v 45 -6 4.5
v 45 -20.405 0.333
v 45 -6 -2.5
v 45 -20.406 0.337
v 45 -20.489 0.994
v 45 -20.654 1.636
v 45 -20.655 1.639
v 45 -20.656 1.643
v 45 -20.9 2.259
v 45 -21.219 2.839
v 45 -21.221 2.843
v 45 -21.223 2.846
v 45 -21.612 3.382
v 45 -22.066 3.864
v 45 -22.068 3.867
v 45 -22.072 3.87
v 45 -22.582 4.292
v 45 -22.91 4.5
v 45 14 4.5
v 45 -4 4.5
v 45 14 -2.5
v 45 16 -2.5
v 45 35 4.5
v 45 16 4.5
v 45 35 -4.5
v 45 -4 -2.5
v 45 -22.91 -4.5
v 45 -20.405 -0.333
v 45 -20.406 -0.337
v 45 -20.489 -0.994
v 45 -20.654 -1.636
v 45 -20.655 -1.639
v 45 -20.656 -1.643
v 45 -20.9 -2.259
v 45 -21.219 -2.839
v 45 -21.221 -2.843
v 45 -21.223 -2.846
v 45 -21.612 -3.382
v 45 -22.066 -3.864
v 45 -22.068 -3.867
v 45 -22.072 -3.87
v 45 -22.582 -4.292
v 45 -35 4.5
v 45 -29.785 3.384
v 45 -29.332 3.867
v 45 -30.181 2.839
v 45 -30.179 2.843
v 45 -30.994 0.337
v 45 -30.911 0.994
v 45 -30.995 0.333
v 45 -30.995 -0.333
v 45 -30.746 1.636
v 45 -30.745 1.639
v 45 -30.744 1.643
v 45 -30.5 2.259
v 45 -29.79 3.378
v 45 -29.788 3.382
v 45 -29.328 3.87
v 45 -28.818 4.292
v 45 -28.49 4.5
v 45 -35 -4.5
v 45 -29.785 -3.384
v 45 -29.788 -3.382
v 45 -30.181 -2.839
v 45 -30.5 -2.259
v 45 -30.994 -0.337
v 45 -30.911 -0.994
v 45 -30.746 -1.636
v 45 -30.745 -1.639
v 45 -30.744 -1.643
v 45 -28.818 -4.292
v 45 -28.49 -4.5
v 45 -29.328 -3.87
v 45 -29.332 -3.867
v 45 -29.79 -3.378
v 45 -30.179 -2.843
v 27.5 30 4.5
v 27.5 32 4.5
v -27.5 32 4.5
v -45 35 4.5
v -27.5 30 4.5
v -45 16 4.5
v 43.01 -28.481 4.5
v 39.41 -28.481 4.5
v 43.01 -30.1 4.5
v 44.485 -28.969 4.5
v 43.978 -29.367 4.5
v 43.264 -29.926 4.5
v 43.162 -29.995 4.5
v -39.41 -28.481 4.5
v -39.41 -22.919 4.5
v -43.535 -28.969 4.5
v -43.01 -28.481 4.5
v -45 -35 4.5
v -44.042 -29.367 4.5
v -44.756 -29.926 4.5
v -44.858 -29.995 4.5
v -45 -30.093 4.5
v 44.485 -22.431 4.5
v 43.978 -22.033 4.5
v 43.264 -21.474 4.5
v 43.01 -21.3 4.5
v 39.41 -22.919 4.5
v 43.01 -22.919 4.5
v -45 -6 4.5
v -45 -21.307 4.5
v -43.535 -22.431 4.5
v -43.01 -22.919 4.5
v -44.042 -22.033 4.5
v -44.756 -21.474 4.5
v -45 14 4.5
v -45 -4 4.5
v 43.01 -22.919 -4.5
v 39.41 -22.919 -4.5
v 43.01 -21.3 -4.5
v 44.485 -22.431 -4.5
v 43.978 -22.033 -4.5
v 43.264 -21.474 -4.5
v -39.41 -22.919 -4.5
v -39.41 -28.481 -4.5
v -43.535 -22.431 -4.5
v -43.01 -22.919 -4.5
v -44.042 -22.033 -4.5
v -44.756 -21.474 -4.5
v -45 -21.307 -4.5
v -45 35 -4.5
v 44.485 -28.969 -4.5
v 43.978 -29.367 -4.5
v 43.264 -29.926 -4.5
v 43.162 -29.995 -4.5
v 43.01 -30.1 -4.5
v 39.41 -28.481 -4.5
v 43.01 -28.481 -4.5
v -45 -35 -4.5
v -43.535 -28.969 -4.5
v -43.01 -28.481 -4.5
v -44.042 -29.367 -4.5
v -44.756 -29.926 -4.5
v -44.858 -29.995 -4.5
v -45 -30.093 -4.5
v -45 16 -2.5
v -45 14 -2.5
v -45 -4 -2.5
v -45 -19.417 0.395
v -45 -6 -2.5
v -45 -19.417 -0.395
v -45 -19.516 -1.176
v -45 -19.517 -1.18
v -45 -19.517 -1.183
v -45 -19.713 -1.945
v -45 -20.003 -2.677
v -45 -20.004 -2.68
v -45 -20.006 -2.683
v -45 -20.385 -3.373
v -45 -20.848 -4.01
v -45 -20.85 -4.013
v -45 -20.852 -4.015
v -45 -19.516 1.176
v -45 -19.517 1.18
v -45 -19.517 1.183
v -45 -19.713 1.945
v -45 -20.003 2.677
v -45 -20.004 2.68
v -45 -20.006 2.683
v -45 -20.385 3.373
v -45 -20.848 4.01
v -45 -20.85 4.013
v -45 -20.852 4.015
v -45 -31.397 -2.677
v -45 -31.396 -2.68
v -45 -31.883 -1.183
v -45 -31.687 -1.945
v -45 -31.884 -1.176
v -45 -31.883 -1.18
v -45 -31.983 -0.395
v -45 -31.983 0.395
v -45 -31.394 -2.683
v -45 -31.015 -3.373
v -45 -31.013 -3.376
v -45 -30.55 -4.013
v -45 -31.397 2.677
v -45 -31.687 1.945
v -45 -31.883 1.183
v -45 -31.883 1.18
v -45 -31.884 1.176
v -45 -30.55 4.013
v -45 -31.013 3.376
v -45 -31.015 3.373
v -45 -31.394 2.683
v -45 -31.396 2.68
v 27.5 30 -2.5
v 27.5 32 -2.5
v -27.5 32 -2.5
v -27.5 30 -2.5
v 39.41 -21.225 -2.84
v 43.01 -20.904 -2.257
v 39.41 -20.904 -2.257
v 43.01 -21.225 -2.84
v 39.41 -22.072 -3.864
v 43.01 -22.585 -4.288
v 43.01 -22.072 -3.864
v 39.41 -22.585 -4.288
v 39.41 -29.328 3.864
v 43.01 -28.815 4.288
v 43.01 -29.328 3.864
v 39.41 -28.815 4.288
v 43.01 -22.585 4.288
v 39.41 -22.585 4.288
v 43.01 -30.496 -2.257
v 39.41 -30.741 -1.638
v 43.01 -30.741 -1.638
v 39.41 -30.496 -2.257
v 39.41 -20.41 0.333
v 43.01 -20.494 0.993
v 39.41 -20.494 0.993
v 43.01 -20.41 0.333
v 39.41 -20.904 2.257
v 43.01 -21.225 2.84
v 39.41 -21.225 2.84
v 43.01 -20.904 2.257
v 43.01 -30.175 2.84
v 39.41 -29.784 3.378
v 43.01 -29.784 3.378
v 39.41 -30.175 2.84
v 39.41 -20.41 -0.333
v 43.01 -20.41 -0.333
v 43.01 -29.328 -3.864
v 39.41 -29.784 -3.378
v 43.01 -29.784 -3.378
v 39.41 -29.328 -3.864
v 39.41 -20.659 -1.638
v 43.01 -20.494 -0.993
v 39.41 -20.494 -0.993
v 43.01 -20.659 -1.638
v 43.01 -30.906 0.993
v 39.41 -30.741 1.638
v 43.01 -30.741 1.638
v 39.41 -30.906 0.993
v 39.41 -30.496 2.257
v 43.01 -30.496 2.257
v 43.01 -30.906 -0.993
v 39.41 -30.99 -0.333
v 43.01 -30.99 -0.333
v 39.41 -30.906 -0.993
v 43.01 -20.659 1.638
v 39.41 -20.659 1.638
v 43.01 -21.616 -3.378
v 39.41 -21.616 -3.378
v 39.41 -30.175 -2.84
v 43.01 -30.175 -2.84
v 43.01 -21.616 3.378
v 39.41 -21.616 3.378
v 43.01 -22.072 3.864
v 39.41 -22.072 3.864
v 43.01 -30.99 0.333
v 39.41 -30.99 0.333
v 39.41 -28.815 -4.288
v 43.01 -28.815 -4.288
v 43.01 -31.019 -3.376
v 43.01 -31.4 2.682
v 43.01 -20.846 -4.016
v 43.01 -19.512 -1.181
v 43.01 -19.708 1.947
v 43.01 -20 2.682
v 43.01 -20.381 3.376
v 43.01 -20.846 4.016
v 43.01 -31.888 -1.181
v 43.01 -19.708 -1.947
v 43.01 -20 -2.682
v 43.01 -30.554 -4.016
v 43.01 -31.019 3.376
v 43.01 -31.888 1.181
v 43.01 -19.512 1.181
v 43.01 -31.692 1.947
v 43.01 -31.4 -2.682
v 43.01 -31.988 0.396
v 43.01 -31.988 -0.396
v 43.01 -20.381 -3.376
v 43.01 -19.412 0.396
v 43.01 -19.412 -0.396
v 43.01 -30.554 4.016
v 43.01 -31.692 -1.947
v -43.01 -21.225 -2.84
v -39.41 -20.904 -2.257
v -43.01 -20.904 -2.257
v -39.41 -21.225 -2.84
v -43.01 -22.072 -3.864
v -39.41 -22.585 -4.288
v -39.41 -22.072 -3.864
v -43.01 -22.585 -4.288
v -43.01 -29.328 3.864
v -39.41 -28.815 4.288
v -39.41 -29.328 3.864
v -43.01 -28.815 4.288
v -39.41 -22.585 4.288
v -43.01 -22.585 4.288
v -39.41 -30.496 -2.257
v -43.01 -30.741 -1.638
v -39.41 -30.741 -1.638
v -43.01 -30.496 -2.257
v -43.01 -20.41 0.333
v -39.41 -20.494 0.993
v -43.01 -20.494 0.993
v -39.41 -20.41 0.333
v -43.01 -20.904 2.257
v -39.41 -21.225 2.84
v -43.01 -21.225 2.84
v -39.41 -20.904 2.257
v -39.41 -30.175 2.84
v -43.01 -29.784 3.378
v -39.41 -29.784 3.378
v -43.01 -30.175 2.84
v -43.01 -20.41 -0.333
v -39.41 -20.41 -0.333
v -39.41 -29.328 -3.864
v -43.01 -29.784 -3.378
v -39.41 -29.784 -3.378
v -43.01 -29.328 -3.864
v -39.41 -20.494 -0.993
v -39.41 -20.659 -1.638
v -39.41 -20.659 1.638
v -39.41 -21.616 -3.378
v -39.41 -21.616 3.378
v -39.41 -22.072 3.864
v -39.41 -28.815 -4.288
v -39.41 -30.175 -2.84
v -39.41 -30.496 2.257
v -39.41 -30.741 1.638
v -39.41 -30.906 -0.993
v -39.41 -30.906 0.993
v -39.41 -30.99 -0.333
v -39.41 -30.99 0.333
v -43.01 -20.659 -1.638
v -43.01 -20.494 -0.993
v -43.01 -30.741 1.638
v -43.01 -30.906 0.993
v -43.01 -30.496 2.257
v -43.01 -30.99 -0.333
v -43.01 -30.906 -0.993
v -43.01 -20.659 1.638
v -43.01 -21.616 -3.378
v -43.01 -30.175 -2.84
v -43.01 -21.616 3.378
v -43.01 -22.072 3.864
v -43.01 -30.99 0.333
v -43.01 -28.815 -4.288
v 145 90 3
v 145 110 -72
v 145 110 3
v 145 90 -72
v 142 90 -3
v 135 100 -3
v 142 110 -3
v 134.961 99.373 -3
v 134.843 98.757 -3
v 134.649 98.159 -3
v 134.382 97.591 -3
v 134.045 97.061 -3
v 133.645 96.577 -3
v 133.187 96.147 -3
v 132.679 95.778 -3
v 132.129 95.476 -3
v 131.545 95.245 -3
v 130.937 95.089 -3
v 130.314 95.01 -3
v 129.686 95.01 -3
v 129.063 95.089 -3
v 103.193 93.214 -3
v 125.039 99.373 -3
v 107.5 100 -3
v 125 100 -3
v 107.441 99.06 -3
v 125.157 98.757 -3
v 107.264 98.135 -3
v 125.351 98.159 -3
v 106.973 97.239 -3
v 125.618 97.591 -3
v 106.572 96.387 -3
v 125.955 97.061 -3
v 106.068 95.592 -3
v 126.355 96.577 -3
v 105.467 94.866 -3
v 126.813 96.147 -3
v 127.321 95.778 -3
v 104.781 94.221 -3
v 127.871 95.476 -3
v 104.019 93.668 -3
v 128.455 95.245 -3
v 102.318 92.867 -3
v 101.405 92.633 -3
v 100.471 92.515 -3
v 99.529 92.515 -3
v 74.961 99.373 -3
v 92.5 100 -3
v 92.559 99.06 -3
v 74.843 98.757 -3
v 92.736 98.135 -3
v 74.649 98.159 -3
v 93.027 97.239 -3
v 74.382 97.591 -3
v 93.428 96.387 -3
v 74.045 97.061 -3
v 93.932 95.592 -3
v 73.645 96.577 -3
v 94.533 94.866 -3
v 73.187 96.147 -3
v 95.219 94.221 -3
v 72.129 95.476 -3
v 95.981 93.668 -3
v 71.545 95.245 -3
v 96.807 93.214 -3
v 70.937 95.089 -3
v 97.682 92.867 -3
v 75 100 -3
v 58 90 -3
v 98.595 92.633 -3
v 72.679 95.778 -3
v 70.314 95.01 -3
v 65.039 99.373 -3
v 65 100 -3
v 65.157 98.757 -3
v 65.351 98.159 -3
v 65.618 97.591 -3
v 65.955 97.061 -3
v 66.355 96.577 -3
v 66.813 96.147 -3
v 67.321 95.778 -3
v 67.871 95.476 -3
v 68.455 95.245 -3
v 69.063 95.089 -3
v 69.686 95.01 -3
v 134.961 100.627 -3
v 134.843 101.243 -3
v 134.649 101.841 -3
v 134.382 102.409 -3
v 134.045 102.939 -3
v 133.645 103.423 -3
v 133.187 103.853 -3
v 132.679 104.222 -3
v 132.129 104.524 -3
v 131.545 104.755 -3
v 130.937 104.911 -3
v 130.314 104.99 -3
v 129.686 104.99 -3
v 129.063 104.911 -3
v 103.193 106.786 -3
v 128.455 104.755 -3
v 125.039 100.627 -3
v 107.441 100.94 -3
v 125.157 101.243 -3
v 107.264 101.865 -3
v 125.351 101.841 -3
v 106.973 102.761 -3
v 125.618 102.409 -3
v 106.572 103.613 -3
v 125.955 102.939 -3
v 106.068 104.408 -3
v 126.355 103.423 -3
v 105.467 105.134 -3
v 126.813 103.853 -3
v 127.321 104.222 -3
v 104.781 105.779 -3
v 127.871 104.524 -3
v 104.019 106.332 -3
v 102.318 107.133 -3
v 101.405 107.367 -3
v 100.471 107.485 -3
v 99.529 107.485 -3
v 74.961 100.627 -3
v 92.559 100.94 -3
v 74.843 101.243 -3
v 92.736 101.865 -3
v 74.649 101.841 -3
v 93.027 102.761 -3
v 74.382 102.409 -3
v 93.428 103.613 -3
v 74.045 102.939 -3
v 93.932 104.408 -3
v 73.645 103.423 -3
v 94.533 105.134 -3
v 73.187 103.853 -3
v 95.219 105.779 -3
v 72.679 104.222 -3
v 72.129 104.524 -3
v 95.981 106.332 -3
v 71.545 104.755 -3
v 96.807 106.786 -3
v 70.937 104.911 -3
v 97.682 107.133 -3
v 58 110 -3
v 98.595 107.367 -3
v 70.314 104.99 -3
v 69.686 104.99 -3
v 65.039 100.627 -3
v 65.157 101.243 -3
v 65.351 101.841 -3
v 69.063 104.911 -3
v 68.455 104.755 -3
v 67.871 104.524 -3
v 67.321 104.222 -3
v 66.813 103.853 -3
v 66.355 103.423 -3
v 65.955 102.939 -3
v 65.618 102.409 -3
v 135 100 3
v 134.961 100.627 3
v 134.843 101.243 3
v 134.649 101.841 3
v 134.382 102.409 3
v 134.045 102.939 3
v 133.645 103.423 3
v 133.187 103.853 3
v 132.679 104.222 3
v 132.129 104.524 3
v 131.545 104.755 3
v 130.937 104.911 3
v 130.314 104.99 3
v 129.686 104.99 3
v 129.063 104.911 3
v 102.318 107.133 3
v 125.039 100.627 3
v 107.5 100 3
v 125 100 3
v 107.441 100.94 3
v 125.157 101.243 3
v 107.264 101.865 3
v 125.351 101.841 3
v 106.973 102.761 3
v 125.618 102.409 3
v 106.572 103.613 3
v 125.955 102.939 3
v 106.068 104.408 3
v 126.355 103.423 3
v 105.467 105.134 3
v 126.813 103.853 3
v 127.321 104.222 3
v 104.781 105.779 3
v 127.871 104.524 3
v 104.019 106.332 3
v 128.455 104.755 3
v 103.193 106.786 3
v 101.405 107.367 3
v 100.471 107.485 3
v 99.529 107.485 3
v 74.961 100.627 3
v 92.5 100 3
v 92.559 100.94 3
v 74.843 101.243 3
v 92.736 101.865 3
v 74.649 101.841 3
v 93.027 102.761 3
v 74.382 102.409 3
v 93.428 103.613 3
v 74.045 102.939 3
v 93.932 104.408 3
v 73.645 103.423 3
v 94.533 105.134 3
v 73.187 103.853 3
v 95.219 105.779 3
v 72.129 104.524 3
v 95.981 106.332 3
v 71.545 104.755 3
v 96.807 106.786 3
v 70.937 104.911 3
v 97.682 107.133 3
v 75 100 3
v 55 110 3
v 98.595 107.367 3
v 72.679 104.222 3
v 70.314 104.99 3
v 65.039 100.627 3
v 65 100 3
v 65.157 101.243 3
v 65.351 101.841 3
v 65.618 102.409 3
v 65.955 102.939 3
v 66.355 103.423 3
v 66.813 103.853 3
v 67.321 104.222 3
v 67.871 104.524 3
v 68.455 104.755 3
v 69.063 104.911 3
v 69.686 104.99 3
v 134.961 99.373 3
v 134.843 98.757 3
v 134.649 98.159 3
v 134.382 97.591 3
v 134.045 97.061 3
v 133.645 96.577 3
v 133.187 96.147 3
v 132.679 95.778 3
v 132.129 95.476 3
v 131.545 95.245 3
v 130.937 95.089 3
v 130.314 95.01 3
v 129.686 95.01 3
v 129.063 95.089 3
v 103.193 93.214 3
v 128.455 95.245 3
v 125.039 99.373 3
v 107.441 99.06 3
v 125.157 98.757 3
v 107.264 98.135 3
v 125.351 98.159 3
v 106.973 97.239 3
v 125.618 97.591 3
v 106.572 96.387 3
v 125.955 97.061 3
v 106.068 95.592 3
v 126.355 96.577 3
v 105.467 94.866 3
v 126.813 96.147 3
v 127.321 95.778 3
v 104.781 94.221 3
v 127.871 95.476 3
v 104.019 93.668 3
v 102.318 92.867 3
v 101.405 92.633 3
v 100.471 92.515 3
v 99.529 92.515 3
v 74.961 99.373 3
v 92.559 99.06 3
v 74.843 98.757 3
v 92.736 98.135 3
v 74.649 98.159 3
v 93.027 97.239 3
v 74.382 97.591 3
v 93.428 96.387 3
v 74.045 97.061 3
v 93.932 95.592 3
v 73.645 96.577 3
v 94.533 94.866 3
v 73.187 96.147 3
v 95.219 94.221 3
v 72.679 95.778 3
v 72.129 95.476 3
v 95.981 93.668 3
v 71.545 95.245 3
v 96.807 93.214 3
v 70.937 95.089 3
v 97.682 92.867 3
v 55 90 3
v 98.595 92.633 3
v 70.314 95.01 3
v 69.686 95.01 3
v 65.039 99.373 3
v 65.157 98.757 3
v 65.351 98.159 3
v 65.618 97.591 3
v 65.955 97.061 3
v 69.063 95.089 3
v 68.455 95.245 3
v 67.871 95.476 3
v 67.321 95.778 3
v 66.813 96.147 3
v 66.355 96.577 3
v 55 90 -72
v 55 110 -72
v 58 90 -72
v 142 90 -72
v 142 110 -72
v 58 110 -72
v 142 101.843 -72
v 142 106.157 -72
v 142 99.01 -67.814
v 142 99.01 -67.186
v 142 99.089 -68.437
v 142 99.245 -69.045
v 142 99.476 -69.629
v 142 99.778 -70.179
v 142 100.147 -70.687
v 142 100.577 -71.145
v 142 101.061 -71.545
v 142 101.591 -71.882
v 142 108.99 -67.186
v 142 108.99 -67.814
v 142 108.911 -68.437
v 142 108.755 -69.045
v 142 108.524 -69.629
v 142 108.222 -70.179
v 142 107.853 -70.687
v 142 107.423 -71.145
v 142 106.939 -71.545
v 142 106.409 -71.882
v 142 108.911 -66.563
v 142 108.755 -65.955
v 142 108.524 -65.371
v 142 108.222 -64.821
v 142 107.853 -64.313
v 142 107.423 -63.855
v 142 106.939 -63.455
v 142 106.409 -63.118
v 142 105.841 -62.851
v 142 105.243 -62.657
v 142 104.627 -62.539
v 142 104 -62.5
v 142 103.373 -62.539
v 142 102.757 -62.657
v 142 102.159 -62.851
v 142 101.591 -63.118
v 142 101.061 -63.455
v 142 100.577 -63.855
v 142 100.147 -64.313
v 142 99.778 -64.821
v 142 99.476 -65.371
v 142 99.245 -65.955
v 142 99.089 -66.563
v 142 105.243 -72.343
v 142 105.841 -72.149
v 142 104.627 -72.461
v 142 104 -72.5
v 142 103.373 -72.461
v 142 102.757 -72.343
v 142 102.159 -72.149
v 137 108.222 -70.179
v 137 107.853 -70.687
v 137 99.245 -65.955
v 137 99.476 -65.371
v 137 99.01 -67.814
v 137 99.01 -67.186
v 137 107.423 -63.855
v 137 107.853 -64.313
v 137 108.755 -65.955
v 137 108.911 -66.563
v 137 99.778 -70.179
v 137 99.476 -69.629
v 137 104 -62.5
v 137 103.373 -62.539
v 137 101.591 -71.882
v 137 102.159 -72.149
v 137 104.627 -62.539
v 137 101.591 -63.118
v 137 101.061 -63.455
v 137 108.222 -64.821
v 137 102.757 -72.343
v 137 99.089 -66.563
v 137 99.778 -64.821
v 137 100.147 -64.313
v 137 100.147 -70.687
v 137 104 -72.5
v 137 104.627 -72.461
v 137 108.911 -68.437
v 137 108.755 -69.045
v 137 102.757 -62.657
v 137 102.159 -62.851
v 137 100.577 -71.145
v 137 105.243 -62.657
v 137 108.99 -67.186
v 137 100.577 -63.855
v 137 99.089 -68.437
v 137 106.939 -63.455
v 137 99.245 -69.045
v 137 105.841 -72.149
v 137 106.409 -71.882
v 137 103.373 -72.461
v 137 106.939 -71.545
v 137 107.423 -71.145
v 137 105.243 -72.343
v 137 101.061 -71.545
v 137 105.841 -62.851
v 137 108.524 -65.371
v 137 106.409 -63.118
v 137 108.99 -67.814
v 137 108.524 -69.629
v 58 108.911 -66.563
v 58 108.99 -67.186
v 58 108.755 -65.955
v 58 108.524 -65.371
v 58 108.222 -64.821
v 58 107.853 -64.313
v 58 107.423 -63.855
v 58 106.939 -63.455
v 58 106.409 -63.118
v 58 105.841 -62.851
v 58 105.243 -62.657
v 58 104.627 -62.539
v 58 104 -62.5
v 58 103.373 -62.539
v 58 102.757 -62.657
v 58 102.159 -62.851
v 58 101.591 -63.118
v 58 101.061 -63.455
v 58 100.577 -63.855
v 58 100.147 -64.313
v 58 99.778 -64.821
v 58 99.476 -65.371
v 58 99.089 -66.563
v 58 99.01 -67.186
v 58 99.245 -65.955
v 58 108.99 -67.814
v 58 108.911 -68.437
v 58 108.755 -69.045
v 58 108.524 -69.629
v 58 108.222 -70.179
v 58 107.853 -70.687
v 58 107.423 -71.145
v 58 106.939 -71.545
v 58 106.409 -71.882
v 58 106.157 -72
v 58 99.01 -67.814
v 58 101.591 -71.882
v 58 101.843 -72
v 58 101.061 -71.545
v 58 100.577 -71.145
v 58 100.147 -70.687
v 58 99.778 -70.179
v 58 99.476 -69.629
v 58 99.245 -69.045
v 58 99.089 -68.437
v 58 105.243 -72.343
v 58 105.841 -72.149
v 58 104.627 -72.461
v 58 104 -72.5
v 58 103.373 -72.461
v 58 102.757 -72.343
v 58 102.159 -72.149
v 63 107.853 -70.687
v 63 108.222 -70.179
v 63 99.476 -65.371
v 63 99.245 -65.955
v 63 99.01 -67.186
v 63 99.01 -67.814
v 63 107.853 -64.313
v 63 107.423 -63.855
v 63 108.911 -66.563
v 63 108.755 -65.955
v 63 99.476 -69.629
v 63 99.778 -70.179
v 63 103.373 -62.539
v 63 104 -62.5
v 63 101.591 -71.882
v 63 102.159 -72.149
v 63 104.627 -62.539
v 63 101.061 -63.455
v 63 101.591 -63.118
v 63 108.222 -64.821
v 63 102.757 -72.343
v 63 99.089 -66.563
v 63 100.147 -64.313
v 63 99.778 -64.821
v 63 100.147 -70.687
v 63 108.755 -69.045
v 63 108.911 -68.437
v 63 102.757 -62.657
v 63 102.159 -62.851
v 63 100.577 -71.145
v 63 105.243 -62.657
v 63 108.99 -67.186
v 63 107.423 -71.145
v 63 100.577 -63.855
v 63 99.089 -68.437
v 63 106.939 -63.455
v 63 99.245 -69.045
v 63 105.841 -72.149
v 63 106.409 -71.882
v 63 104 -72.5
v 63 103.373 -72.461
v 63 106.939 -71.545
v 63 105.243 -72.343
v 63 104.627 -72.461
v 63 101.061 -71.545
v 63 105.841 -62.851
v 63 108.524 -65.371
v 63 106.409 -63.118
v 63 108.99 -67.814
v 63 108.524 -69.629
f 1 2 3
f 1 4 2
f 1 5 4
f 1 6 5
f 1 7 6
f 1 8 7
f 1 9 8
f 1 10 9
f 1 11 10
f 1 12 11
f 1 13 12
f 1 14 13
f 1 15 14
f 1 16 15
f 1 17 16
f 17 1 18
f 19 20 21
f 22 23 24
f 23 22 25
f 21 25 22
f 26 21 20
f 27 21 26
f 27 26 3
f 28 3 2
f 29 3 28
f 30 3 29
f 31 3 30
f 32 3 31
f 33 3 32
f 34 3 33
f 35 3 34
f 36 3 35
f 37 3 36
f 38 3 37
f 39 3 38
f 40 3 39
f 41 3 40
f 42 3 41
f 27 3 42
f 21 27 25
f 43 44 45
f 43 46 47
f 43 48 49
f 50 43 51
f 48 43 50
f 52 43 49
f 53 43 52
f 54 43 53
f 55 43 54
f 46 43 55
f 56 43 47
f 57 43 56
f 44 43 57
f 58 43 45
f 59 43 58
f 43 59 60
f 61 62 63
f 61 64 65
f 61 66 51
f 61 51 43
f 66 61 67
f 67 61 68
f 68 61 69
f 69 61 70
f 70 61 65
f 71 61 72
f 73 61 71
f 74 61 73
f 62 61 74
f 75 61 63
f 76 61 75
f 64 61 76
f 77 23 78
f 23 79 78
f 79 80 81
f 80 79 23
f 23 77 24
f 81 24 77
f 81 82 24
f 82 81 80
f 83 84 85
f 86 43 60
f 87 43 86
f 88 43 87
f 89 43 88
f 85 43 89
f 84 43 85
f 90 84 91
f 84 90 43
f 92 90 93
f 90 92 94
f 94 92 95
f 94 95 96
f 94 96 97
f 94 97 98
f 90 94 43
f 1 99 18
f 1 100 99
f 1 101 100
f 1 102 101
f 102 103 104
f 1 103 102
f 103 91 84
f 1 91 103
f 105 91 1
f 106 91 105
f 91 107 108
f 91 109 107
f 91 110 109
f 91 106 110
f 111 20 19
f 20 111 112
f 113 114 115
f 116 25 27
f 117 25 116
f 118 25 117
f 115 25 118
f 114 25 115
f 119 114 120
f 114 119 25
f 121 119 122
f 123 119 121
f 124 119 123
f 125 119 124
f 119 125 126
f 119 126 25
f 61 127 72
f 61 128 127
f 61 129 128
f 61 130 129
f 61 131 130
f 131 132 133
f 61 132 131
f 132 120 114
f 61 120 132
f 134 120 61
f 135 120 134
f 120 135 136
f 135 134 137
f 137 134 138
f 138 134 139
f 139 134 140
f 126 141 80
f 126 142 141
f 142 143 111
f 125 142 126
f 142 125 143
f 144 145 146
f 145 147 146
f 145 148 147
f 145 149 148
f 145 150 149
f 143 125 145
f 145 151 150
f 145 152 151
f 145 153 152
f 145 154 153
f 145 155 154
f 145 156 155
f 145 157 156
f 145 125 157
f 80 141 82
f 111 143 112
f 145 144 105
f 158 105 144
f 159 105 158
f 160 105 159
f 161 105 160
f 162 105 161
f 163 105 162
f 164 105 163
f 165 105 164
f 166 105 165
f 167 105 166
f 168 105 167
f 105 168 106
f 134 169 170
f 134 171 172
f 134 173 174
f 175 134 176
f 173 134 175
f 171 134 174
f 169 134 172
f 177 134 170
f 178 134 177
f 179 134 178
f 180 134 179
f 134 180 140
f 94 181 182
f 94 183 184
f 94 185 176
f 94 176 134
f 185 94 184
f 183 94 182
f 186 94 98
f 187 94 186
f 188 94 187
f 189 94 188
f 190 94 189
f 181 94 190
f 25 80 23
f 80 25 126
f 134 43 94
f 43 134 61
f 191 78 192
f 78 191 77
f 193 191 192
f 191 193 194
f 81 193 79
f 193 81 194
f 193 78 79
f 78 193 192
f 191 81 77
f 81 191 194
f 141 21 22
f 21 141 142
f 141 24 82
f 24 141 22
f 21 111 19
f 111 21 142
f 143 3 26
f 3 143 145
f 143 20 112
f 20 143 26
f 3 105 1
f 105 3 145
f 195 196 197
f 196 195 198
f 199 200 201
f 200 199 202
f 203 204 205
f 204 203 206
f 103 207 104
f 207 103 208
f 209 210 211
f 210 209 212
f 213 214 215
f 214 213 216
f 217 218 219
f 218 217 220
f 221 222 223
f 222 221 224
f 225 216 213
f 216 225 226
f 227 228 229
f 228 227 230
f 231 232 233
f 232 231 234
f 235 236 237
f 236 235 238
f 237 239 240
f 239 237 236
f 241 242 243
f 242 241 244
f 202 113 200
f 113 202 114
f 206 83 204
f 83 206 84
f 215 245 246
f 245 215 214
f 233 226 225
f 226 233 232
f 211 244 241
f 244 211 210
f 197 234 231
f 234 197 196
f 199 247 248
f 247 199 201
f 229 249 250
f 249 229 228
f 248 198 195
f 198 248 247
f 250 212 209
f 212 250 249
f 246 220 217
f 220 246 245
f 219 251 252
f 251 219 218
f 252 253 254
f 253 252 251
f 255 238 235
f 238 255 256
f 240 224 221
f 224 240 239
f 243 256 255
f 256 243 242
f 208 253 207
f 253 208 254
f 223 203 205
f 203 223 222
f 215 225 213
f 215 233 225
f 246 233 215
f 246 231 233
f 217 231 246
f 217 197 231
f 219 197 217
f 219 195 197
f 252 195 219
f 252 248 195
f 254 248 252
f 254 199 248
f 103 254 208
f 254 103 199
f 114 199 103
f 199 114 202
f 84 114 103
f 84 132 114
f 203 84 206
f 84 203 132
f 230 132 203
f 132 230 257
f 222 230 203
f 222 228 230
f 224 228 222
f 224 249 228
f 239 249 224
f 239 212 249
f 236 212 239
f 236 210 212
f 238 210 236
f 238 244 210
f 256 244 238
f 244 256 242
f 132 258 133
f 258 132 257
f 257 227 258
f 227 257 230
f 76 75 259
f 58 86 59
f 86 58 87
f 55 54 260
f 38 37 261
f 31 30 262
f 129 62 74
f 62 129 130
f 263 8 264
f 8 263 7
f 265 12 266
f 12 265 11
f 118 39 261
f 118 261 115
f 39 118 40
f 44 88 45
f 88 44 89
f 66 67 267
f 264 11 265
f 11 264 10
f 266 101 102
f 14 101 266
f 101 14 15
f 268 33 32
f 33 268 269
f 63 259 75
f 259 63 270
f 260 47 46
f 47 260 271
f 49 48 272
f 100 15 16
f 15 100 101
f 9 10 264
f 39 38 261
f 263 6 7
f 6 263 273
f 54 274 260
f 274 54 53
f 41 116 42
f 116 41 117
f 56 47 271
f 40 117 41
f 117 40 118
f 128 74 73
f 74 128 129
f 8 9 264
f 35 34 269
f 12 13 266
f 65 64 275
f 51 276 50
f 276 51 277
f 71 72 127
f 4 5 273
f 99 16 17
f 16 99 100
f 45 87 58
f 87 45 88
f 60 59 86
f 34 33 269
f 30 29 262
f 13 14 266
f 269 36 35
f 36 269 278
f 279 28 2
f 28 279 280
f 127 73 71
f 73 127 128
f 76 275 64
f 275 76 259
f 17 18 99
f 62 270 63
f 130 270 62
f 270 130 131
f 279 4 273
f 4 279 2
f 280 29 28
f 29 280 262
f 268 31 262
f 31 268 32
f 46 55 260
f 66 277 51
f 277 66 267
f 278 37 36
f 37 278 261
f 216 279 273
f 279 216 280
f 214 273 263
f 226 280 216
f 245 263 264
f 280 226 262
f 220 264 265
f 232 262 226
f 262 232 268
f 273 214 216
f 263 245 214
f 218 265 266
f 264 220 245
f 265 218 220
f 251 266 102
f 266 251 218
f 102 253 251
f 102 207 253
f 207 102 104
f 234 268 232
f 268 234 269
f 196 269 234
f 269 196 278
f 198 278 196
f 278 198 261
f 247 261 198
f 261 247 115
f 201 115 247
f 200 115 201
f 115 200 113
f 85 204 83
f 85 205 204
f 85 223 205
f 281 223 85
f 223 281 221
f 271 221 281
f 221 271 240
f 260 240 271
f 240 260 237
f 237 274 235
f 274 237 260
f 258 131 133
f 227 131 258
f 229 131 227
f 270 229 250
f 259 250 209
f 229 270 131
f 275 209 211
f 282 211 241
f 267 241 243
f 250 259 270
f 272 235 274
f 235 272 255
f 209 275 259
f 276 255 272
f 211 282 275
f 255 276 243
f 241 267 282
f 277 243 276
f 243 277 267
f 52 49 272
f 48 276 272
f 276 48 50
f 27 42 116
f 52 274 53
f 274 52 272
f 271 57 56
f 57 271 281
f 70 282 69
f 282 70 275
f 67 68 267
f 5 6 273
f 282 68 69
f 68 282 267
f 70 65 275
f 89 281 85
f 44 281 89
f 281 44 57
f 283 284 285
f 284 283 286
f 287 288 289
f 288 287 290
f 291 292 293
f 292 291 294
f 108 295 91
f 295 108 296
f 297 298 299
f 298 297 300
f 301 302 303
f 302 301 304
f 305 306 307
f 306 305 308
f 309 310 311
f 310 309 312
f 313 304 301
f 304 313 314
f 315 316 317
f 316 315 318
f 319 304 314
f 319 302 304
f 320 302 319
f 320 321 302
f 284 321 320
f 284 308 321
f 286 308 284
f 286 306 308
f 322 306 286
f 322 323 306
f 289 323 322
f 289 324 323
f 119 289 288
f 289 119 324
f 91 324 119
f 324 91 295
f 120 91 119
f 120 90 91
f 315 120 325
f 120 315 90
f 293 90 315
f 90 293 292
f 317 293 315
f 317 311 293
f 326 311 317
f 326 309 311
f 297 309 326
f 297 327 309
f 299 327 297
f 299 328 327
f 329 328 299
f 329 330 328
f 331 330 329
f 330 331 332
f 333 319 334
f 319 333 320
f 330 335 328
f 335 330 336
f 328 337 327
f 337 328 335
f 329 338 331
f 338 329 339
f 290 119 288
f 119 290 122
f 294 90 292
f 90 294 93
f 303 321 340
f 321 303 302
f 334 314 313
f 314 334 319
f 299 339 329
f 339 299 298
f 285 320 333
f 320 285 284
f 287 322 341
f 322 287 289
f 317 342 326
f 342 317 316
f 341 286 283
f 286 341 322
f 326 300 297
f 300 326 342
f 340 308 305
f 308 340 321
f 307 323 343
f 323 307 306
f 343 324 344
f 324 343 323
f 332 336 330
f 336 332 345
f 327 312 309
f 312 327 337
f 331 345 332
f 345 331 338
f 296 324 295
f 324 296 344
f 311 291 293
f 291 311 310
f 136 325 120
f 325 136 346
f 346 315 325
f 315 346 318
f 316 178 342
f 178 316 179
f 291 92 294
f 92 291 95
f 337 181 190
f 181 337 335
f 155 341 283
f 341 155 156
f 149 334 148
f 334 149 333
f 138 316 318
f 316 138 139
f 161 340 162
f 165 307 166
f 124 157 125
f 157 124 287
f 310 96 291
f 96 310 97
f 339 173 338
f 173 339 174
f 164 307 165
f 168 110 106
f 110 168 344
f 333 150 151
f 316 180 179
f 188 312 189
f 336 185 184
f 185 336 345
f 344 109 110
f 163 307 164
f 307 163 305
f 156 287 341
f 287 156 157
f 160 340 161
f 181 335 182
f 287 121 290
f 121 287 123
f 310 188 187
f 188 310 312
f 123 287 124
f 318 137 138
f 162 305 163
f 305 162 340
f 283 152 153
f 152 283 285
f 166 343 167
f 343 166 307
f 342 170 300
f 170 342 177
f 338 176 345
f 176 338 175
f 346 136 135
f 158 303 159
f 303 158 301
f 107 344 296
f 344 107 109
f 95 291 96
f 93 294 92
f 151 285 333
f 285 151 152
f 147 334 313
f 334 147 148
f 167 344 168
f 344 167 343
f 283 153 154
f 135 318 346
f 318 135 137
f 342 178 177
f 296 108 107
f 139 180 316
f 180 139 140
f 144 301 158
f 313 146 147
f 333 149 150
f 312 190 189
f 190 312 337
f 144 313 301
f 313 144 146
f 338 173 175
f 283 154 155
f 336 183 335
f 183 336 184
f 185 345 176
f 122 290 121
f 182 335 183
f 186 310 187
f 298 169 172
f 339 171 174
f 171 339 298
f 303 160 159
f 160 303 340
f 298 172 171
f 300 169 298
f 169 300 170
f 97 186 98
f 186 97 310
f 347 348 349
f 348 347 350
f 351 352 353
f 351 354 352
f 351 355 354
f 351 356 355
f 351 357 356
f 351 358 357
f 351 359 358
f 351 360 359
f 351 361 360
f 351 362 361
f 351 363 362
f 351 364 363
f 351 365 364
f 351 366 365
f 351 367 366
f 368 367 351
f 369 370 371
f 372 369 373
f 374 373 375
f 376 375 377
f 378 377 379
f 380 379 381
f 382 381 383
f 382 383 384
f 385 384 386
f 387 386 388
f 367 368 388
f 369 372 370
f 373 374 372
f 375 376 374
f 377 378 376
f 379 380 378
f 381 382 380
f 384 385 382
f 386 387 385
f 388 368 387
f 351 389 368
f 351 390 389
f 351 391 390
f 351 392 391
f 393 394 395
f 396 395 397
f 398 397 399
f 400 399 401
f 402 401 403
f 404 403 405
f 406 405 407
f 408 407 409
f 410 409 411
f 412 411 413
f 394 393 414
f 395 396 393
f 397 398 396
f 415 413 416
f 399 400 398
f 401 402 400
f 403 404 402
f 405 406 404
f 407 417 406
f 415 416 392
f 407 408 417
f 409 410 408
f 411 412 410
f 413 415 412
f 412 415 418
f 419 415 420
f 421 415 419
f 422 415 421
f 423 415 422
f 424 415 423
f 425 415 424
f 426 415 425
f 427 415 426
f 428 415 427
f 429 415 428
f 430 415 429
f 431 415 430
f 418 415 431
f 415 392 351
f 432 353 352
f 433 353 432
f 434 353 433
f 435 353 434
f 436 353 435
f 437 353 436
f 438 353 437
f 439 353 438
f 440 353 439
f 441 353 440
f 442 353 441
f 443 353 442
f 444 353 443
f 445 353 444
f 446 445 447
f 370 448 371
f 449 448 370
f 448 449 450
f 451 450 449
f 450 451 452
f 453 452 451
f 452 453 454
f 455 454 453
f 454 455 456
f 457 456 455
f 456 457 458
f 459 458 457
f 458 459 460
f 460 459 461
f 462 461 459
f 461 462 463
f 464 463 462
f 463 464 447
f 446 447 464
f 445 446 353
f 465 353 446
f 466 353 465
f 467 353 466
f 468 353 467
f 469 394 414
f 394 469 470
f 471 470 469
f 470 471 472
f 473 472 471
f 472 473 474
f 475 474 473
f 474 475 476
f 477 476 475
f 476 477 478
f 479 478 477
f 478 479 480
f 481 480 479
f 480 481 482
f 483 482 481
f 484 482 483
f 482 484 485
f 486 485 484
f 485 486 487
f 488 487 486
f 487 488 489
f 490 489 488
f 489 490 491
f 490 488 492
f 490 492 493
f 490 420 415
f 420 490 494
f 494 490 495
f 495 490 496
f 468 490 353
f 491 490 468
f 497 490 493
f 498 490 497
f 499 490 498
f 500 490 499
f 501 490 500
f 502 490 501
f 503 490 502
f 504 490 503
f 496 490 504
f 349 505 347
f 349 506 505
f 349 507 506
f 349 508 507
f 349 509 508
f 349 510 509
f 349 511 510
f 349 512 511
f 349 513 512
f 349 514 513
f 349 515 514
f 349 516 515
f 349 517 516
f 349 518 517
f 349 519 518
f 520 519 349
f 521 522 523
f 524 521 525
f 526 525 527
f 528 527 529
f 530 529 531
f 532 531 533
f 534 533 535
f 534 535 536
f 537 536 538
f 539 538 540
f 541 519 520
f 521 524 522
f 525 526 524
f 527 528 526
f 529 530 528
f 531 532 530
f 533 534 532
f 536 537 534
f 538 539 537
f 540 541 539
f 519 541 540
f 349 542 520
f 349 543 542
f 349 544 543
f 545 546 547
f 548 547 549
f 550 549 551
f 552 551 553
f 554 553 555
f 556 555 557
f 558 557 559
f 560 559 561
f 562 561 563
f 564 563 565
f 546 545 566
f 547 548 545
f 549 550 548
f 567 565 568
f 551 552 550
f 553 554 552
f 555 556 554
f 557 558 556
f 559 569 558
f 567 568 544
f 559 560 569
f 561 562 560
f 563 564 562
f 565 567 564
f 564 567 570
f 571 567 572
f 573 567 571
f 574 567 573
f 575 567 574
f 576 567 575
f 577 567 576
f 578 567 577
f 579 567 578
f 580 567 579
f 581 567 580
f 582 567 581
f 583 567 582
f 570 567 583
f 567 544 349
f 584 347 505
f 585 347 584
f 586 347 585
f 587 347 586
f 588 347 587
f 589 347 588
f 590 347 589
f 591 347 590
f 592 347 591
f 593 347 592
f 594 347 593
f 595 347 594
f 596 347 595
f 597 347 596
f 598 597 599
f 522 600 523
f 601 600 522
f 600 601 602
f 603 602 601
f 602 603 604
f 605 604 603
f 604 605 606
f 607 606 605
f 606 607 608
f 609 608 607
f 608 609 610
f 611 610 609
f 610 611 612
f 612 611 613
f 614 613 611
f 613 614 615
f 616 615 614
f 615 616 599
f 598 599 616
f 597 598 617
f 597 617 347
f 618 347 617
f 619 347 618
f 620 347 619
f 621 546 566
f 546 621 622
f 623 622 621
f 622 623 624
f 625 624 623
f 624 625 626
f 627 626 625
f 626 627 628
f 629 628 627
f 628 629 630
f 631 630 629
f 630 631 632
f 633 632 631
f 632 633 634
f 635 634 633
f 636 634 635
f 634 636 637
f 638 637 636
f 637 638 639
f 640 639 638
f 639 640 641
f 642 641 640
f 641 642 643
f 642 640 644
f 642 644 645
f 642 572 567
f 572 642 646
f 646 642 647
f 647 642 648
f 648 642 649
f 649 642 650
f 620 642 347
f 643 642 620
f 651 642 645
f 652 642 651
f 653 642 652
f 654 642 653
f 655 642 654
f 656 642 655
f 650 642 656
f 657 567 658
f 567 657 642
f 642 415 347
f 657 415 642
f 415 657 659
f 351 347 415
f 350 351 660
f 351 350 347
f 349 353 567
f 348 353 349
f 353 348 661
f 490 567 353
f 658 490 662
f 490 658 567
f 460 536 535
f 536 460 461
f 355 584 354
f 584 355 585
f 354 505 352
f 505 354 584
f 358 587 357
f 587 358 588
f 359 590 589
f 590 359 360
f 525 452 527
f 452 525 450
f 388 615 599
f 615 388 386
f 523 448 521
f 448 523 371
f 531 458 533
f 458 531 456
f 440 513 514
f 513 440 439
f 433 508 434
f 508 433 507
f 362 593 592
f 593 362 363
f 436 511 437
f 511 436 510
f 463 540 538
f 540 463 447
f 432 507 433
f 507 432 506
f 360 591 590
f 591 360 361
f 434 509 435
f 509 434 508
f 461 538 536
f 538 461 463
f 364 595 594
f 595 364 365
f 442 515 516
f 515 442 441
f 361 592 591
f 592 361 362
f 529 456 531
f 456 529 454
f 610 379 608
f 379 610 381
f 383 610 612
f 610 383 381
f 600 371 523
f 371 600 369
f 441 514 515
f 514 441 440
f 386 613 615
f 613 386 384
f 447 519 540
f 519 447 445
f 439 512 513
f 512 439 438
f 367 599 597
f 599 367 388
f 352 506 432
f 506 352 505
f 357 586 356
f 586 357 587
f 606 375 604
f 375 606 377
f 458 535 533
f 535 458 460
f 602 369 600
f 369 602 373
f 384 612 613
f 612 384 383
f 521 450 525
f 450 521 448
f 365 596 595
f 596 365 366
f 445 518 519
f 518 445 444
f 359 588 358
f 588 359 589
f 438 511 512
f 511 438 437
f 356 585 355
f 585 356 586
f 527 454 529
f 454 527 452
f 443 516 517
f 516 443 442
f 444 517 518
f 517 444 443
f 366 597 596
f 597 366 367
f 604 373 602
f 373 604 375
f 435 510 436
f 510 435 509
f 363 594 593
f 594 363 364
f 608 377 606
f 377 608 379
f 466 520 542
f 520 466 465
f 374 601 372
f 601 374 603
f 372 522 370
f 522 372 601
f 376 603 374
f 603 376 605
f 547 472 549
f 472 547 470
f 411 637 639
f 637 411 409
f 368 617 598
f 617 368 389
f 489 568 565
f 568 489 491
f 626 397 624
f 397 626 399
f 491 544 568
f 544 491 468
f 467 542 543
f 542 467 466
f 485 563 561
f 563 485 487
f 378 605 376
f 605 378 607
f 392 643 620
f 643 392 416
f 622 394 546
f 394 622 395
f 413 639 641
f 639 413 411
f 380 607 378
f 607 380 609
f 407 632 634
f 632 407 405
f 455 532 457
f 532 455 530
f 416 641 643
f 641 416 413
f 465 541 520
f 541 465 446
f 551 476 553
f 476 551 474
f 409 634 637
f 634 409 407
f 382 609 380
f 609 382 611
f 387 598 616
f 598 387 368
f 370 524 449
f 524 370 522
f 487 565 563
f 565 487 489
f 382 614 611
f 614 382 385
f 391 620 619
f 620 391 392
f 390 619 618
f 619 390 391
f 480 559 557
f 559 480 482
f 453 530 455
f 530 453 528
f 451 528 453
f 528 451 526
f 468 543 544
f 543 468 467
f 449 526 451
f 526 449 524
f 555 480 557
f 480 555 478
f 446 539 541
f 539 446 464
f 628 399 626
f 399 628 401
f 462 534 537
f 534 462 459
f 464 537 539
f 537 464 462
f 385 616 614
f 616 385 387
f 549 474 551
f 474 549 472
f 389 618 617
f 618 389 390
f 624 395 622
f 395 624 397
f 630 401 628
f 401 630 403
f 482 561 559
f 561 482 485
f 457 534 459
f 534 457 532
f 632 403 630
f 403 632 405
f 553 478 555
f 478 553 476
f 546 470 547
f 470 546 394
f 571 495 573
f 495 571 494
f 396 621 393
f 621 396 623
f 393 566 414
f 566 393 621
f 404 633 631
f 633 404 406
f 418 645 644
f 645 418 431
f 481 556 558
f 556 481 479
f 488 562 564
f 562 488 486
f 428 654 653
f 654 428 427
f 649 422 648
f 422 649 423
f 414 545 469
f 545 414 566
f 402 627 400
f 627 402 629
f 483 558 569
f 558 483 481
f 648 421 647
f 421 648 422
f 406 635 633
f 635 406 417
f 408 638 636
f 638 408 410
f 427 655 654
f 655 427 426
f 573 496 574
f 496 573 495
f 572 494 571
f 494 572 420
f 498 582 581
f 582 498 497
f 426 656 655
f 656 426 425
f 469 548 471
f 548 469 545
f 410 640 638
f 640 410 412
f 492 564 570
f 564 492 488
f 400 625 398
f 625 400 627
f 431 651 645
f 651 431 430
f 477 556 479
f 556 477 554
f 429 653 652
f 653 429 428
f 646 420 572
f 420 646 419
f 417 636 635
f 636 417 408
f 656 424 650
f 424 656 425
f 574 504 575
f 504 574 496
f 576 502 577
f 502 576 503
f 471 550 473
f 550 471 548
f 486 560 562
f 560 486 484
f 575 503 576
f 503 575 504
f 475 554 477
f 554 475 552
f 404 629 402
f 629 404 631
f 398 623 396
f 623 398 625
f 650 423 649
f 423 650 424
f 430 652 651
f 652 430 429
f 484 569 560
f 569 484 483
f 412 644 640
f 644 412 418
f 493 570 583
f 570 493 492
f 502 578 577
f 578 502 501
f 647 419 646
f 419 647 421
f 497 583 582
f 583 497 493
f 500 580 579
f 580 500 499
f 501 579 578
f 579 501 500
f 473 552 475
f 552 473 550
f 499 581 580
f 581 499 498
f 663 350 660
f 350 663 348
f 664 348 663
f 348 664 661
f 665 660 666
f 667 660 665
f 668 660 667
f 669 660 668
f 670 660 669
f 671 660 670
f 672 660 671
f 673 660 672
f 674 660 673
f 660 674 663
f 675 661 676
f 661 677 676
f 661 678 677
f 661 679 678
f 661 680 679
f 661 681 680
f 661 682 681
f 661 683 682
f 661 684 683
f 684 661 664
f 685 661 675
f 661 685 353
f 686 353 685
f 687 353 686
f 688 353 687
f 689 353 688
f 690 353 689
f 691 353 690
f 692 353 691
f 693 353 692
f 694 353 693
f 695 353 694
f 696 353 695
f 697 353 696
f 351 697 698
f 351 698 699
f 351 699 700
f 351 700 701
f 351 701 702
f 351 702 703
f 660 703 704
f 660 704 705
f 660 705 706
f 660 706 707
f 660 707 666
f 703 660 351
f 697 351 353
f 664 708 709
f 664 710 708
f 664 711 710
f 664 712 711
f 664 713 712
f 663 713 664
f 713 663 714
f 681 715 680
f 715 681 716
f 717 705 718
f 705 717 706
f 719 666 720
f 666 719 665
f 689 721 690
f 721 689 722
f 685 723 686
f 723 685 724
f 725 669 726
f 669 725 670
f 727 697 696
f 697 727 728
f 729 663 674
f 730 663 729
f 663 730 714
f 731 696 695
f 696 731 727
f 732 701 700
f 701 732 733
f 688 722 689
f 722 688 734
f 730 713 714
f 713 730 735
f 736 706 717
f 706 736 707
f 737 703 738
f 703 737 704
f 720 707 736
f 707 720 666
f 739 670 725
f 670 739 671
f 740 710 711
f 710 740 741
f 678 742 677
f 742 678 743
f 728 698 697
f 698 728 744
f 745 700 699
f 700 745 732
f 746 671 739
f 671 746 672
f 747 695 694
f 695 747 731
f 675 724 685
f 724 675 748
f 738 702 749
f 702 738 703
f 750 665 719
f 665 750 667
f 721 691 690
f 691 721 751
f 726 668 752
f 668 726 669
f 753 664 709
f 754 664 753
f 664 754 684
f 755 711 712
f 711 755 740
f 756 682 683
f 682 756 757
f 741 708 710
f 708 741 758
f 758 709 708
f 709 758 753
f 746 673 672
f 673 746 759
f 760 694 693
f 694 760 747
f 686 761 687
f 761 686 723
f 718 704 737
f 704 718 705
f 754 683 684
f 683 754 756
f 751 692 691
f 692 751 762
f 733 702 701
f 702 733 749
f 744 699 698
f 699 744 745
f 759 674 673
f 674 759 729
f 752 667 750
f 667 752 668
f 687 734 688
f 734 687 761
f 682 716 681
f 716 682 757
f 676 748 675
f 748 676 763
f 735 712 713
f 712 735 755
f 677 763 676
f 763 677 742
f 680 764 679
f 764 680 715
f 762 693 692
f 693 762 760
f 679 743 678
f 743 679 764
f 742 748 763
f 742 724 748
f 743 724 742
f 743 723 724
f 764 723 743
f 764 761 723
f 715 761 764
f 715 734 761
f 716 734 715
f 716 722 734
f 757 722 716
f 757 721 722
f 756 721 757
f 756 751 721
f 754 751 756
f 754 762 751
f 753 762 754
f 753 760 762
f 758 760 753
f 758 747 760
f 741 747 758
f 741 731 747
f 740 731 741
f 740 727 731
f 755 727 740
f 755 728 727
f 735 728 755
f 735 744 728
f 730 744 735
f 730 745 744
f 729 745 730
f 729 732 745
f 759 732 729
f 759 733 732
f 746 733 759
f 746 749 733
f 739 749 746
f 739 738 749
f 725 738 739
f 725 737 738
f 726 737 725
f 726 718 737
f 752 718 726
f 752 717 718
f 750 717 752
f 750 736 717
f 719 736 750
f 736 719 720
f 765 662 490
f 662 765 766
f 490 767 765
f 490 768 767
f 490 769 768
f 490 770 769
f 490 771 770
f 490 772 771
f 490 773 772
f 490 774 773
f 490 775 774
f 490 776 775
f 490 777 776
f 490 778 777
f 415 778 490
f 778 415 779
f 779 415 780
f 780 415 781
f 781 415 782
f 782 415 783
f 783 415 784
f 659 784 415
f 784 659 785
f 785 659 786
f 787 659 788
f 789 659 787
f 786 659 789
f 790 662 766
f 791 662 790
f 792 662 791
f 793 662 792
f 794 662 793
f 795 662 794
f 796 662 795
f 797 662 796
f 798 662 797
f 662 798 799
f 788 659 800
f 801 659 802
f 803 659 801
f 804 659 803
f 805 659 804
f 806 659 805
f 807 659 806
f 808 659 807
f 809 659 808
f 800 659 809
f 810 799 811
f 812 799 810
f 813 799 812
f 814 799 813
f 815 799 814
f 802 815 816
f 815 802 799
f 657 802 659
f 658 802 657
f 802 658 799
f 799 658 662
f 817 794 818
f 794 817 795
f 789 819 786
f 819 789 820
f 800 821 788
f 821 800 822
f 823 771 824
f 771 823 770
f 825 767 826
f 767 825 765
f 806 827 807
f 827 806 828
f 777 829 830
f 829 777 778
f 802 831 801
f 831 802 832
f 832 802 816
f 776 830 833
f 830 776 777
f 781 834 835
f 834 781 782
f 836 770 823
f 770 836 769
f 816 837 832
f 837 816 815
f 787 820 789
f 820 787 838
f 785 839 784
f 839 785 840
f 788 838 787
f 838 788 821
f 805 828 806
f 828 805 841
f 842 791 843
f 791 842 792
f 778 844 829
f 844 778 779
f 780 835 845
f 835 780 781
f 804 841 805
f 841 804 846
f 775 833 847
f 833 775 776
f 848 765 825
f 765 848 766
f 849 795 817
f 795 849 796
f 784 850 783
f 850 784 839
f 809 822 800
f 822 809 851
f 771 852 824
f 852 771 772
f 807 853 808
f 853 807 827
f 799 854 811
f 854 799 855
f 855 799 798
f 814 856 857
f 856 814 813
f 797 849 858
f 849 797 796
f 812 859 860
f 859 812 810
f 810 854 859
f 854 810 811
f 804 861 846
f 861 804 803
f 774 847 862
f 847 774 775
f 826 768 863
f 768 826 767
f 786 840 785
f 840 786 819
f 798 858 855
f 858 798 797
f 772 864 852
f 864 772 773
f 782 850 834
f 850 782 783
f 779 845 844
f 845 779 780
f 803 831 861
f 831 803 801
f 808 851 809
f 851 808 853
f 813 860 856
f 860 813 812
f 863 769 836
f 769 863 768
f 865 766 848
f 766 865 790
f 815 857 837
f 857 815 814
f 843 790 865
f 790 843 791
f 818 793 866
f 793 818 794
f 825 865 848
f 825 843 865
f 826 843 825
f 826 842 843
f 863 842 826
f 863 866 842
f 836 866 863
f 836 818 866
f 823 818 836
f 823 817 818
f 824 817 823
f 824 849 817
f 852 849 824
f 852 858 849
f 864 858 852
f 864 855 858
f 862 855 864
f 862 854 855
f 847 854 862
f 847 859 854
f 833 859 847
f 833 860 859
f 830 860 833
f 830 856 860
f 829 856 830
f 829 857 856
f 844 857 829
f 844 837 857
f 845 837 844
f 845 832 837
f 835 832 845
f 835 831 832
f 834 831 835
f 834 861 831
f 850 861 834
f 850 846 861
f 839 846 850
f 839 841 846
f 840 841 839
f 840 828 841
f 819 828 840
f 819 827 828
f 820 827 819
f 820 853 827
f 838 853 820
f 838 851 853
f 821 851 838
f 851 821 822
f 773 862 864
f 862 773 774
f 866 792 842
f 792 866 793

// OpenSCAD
$baseWidth = 90;
$baseDepth = 70;
$baseThickness = 9;

$topDepth = 20;
$topThickness = 6;
$topHeight = 75;

$sideWallThickness = 3;
$pinDiameter = 10;
$pinLength = 5;
$pinSocketClearance = 0.6;
$pinSocketDiameter = $pinDiameter + $pinSocketClearance;
$pinSocketDepth = $pinLength + 0.6;
$pinLeadInDepth = 2;
$pinLeadInDiameter = $pinSocketDiameter + 2;
$topPinY = -4;
$socketInsetFromNegativeY = 4;
$pinSocketY = -($baseDepth/2 - $pinSocketDiameter/2 - $socketInsetFromNegativeY);
$topPinZ = $topHeight - $sideWallThickness/2 - $sideWallThickness*2;
$socketAxisZ = 0;
$pinSocketZ = $socketAxisZ;
viewMode = "separated"; // [separated, assembledUp, assembledFolded]
$separatedTopOffset = [100,100,0];
$topPrintFlipX = 180;
$assembledUpXAngle = 180;
$assembledFoldedXAngle = 90;
$assembledUpYAngle = 0;
$assembledFoldedYAngle = 0;


module basePiece(){
	difference(){
		cube([$baseWidth, $baseDepth, $baseThickness], center = true);

		translate([0,$baseDepth/2 - 4,2])
		#cube([55, 2, $baseThickness], center = true);

		translate([0,$baseDepth/2 - 20,2])
		#cube([$baseWidth*1.1, 2, $baseThickness], center = true);
		
		translate([0,$baseDepth/2 - 40,2])
		#cube([$baseWidth*1.1, 2, $baseThickness], center = true);

		translate([$baseWidth/2 - $pinSocketDepth/2 + 0.01, $pinSocketY, $pinSocketZ])
		rotate([0,90,0])
		cylinder($fn=50, h=$pinSocketDepth, d=$pinSocketDiameter, center=true);

		translate([$baseWidth/2 - $pinLeadInDepth/2 + 0.01, $pinSocketY, $pinSocketZ])
		rotate([0,90,0])
		cylinder($fn=50, h=$pinLeadInDepth, d1=$pinLeadInDiameter, d2=$pinSocketDiameter, center=true);

		translate([-($baseWidth/2 - $pinSocketDepth/2 + 0.01), $pinSocketY, $pinSocketZ])
		rotate([0,90,0])
		cylinder($fn=50, h=$pinSocketDepth, d=$pinSocketDiameter, center=true);

		translate([-($baseWidth/2 - $pinLeadInDepth/2 + 0.01), $pinSocketY, $pinSocketZ])
		rotate([0,90,0])
		cylinder($fn=50, h=$pinLeadInDepth, d1=$pinLeadInDiameter, d2=$pinSocketDiameter, center=true);
	}
}

module topPiece(){
	group(){
		// Top
		difference(){
			cube([$baseWidth, $topDepth, $topThickness], center = true);

			// Left
			translate([$baseWidth/3, 0, 0])
			#cylinder($fn=50, h=$topThickness*1.1, d = 10, center = true);

			// Middle
			#cylinder($fn=50, h=$topThickness*1.1, d = 15, center = true);
			
			// Right
			translate([-$baseWidth/3, 0, 0])
			#cylinder($fn=50, h=$topThickness*1.1, d = 10, center = true);
		}

		// Top, Side 1
		translate([$baseWidth/2 - $sideWallThickness/2,0,$topHeight/2 - $topThickness/2])
		cube([$sideWallThickness, $topDepth, $topHeight], center=true);

		translate([
			$baseWidth/2 - $sideWallThickness - $pinLength/2,
			$topPinY,
			$topPinZ
		])
		rotate([0,90,0])
		cylinder($fn=50, h=$pinLength, d=$pinDiameter, center=true);

		// Top, Side 2
		translate([-($baseWidth/2 - $sideWallThickness/2),0,$topHeight/2 - $topThickness/2])
		cube([$sideWallThickness, $topDepth, $topHeight], center=true);

		translate([
			-($baseWidth/2 - $sideWallThickness) + $pinLength/2,
			$topPinY,
			$topPinZ
		])
		rotate([0,90,0])
		cylinder($fn=50, h=$pinLength, d=$pinDiameter, center=true);
	}
}

module topPieceAssembled(xAngle=0, yAngle=0){
	translate([0, $pinSocketY, $pinSocketZ])
	rotate([xAngle,yAngle,0])
	translate([0, -$topPinY, -$topPinZ])
	topPiece();
}

if(viewMode == "separated"){
	basePiece();
	translate($separatedTopOffset)
	rotate([$topPrintFlipX,0,0])
	topPiece();
} else if(viewMode == "assembledUp"){
	basePiece();
	topPieceAssembled($assembledUpXAngle, $assembledUpYAngle);
} else if(viewMode == "assembledFolded"){
	basePiece();
	topPieceAssembled($assembledFoldedXAngle, $assembledFoldedYAngle);
} else {
	echo("Unknown viewMode. Use separated, assembledUp, or assembledFolded.");
	basePiece();
}
